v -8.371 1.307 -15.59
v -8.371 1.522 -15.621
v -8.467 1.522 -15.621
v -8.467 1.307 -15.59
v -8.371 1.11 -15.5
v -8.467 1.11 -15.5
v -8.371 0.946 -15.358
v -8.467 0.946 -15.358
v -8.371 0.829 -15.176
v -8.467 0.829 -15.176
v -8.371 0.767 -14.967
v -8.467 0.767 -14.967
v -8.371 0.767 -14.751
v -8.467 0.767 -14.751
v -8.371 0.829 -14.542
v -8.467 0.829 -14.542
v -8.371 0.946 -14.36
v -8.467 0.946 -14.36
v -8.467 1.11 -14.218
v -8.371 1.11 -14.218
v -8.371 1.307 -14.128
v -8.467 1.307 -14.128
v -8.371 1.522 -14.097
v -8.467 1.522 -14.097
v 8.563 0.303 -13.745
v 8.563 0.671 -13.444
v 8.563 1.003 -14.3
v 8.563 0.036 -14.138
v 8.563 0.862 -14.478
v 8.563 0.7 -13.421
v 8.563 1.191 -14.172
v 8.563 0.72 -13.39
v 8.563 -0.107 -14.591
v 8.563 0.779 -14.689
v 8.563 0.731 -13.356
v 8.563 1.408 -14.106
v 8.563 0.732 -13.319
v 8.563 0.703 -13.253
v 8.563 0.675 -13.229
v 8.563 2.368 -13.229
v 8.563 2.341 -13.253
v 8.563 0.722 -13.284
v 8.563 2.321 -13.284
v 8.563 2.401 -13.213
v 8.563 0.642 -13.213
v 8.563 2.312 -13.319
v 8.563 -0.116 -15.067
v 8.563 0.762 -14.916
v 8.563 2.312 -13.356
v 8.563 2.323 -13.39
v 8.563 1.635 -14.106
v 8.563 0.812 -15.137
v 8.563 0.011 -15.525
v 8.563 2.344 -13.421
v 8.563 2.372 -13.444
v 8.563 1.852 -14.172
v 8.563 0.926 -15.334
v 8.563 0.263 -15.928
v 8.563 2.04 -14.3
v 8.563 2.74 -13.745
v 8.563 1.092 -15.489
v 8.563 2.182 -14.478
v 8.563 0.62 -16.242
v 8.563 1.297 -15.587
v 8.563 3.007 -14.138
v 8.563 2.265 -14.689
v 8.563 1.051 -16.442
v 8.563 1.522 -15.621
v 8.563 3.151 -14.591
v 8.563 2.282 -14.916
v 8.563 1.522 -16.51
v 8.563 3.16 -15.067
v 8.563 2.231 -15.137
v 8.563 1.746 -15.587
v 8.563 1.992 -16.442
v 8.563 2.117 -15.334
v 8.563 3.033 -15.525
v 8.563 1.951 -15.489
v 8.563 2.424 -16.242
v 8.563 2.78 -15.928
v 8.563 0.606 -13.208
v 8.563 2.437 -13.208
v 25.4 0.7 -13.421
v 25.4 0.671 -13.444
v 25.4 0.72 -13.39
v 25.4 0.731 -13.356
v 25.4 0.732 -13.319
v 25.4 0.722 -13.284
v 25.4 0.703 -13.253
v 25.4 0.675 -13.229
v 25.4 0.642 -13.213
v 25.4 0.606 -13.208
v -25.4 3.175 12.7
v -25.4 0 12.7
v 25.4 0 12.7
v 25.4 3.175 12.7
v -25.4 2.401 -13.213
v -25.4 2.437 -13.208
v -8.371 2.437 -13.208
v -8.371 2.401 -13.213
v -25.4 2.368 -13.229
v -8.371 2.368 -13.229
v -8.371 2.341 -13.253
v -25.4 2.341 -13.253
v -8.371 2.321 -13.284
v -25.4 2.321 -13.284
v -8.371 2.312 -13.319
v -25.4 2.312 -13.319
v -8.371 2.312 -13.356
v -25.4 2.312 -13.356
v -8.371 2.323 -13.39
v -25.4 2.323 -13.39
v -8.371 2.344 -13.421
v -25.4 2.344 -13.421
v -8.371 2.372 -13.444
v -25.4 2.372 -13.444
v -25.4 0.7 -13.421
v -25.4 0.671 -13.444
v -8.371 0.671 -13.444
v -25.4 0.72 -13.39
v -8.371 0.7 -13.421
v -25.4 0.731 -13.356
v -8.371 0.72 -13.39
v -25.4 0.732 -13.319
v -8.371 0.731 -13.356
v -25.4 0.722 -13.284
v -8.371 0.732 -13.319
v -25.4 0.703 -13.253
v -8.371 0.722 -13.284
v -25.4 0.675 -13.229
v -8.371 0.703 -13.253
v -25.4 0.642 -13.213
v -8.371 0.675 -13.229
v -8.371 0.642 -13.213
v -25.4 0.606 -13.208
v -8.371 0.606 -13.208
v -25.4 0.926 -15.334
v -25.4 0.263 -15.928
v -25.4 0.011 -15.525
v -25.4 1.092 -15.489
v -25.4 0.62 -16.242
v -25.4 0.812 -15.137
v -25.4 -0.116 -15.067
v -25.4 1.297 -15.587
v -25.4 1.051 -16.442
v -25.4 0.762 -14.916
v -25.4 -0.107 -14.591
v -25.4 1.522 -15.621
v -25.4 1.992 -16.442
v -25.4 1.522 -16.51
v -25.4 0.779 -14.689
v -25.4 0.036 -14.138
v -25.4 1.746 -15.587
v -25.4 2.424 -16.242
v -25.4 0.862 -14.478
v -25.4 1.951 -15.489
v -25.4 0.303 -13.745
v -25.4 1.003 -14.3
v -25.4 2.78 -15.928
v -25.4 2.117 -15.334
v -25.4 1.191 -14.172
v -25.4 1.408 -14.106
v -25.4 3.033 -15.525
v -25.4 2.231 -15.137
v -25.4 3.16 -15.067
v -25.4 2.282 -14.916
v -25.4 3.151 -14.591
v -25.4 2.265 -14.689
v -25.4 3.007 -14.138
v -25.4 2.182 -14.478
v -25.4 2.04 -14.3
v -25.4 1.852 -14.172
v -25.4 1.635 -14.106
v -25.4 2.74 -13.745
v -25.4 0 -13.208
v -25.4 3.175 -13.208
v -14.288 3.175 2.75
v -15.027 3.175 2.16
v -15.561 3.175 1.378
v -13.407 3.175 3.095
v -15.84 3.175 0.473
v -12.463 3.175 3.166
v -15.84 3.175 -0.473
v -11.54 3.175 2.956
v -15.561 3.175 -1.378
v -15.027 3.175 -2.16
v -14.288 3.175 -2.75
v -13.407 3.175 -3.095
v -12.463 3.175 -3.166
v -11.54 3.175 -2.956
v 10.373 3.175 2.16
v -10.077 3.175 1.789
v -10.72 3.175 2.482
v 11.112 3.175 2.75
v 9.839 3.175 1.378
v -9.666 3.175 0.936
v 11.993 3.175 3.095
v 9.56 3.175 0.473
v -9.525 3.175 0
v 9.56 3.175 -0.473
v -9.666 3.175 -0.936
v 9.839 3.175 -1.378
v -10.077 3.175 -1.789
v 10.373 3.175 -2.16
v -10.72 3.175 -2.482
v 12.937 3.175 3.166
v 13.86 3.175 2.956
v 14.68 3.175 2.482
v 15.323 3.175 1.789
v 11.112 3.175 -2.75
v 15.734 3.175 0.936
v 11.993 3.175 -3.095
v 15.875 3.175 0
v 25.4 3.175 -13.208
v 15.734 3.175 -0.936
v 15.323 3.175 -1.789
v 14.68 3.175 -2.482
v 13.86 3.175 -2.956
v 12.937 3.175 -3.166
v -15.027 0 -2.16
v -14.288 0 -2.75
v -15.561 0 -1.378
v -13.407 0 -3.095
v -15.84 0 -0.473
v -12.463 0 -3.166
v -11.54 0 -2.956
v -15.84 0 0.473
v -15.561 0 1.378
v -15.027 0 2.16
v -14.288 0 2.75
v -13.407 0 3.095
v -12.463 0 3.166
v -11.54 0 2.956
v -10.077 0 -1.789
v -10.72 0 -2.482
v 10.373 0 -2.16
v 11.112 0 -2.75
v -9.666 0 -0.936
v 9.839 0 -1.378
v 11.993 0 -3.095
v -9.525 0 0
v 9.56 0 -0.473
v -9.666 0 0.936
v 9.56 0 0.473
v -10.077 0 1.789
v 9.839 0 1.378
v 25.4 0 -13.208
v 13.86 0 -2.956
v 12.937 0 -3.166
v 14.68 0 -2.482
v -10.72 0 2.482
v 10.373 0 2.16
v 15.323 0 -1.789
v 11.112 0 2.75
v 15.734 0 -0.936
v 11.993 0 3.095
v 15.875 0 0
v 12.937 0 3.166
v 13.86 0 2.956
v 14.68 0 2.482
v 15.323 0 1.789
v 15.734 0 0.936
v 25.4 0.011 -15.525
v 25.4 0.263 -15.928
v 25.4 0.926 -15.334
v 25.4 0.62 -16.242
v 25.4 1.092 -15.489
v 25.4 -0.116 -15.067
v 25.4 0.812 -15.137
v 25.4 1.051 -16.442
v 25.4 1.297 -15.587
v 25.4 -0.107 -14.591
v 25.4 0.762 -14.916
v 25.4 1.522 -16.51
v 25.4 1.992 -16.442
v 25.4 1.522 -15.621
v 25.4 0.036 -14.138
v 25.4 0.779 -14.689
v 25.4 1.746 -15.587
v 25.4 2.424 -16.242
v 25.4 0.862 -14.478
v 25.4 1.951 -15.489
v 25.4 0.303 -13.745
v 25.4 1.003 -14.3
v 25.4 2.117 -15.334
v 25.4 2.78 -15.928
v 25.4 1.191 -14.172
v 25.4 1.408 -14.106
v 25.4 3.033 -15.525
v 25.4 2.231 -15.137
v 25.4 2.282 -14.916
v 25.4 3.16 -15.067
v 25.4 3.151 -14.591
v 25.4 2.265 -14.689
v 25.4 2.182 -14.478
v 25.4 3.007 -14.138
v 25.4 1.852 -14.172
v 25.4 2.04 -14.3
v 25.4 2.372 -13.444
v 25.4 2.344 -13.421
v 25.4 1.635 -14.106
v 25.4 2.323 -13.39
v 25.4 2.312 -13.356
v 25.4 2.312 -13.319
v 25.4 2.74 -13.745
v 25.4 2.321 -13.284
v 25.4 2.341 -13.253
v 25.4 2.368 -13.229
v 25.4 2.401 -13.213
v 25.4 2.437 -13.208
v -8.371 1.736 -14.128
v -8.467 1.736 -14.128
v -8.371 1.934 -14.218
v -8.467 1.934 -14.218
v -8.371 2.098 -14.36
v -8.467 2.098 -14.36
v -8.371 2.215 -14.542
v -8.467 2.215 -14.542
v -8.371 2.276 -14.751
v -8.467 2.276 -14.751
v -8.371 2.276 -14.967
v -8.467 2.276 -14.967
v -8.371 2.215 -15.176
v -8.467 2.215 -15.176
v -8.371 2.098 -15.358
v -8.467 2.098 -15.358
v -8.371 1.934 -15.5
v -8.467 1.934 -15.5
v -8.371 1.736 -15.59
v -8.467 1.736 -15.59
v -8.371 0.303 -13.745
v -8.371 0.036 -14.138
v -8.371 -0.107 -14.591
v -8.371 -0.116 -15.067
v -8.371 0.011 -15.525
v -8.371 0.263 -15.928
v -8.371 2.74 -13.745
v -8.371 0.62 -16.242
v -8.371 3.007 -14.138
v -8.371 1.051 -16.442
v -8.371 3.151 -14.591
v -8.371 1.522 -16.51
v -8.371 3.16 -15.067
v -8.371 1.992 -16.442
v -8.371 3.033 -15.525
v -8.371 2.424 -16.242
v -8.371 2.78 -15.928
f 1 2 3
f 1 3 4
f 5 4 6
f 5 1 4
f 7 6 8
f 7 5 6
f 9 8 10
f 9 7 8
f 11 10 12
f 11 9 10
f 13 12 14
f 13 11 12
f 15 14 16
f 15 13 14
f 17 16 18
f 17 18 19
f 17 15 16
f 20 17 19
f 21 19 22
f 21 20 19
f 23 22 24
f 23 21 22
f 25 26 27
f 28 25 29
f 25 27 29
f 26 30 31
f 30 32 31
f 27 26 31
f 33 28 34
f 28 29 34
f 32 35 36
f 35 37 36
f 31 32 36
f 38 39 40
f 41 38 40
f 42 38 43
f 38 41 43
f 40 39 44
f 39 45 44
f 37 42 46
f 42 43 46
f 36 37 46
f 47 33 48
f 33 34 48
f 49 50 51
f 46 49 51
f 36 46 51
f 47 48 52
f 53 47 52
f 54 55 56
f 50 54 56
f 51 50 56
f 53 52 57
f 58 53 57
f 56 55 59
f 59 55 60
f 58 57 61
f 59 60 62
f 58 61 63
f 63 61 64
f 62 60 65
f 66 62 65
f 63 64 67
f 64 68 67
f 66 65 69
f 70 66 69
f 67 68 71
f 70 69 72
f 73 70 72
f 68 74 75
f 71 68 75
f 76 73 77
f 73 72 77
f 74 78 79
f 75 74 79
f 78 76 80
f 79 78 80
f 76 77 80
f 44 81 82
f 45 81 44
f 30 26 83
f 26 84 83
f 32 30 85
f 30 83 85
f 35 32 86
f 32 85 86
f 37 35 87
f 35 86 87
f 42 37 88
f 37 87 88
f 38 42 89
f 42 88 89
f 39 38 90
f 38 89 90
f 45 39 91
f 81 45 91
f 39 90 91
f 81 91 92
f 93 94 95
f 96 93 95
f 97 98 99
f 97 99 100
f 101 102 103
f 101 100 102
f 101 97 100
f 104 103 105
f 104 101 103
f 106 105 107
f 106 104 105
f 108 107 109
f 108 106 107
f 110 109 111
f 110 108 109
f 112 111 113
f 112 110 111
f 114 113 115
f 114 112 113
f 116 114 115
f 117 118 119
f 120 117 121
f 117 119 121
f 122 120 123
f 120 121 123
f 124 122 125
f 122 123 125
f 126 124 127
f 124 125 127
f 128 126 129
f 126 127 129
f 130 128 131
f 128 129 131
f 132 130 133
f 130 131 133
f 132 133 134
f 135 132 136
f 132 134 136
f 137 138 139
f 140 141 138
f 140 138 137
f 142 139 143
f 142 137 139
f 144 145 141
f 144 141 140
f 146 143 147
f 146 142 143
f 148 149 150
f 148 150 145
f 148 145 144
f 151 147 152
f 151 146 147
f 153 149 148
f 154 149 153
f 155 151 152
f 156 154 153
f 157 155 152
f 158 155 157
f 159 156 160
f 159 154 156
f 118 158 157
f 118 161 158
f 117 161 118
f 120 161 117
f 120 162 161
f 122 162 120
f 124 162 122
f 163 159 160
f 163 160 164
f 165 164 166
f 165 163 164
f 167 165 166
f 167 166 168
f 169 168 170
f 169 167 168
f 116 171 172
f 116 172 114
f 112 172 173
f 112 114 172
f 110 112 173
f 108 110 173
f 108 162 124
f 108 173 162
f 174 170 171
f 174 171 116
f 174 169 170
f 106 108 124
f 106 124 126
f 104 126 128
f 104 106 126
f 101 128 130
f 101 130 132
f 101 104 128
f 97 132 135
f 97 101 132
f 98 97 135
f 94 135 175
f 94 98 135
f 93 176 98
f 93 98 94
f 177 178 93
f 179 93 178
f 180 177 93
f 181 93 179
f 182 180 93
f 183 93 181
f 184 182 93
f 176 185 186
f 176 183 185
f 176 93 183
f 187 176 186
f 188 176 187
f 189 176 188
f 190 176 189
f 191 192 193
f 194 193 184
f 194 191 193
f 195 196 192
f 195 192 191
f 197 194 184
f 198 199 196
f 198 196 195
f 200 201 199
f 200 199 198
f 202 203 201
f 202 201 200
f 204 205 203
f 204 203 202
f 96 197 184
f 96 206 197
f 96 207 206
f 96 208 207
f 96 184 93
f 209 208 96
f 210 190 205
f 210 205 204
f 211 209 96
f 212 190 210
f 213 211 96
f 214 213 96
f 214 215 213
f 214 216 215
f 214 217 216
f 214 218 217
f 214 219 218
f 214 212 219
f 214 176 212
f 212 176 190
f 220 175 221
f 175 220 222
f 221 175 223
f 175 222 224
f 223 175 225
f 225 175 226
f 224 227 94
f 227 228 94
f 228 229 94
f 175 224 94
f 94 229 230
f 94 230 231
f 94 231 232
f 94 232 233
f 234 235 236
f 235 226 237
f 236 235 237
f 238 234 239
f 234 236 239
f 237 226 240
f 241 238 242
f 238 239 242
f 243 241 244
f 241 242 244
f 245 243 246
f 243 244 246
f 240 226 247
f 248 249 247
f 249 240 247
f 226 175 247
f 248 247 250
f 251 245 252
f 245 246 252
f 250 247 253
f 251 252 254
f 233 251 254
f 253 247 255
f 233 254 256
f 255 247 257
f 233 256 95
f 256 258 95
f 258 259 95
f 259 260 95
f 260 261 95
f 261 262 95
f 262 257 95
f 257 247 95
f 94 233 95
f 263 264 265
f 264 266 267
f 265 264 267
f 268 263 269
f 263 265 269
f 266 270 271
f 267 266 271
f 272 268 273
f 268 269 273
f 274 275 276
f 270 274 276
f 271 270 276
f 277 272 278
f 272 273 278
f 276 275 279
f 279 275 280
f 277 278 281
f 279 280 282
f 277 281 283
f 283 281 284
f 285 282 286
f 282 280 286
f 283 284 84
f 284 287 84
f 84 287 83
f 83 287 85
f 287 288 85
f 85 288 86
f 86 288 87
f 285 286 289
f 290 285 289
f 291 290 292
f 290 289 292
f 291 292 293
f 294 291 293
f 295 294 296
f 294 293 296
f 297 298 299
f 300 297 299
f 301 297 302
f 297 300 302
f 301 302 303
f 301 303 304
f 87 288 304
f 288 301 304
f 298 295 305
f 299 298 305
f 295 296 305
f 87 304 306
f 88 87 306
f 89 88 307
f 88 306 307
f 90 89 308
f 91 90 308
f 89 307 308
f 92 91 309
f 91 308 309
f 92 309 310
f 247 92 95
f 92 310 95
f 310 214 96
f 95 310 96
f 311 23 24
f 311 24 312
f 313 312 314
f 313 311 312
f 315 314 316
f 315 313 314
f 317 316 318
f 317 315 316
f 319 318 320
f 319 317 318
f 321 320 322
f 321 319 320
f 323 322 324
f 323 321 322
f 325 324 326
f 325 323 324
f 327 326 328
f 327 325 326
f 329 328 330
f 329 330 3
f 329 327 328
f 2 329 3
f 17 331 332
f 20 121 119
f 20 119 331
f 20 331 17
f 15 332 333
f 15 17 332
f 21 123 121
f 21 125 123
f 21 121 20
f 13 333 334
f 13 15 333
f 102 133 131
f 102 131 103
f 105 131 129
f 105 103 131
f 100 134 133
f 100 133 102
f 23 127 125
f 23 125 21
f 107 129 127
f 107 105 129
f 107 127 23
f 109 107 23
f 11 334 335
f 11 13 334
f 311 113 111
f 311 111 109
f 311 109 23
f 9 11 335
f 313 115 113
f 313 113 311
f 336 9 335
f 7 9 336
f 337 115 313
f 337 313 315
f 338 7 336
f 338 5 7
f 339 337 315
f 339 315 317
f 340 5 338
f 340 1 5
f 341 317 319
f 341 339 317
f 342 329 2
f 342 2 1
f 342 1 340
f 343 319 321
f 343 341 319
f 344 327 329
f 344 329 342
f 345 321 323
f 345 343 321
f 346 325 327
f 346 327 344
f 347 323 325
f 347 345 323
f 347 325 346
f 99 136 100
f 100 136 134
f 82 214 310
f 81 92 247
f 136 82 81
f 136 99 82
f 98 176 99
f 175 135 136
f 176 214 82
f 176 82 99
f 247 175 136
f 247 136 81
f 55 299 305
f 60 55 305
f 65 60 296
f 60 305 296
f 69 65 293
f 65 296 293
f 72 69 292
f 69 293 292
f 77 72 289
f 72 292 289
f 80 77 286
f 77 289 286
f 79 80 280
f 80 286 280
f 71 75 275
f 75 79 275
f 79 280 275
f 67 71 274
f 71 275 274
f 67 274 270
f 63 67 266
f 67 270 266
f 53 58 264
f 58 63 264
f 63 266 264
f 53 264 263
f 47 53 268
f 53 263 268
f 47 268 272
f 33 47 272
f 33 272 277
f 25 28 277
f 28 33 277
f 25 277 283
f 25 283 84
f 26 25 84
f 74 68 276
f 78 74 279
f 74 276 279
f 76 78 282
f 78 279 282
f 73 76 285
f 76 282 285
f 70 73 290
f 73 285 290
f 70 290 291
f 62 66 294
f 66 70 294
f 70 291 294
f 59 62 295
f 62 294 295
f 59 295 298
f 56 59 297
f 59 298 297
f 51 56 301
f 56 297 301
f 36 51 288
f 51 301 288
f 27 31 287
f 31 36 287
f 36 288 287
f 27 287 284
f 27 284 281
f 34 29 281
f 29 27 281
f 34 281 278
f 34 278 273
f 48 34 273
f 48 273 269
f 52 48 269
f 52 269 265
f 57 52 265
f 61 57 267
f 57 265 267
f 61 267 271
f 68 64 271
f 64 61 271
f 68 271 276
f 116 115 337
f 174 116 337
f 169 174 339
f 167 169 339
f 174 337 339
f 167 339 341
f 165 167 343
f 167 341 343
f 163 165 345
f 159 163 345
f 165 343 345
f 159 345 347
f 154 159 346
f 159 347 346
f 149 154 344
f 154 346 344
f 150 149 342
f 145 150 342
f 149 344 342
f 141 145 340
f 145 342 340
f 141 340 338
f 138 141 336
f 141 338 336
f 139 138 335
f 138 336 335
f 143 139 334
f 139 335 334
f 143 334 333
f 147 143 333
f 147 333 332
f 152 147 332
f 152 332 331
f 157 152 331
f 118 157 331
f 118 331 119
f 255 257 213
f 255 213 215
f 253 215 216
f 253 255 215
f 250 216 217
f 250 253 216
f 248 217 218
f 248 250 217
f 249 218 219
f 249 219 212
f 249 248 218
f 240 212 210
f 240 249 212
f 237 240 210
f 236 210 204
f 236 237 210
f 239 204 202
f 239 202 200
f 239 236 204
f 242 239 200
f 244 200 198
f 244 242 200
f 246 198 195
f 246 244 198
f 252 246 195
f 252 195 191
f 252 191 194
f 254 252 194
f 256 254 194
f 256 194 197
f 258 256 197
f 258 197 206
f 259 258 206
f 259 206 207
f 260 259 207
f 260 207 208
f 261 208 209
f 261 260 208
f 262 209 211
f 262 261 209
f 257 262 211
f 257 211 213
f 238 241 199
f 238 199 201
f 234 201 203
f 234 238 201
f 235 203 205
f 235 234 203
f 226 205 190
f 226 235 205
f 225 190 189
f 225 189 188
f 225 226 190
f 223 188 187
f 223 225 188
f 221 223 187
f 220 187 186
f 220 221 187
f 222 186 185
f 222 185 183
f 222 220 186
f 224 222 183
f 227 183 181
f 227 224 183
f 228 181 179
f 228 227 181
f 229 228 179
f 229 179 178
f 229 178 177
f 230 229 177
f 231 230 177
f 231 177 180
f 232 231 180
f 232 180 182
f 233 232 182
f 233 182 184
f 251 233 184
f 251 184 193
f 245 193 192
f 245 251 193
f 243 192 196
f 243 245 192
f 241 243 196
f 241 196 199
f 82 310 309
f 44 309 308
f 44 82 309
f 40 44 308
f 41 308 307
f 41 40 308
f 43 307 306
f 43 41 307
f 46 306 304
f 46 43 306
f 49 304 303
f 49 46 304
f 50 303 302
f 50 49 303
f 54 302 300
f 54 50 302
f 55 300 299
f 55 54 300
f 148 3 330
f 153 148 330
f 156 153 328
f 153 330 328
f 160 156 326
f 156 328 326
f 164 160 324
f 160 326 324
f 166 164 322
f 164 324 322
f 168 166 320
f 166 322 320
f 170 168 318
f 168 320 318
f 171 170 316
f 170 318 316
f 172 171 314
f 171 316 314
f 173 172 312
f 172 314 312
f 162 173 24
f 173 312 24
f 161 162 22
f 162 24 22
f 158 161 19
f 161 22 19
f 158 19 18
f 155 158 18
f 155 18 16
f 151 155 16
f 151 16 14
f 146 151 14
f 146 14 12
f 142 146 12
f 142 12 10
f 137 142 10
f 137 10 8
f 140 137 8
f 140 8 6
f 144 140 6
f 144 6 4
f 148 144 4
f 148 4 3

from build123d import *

# Parameters (mm, degrees)
CROQUIS3_W              = 50.8
CROQUIS3_H              = 25.4
CROQUIS3_R              = 3.175
SALIENTE_EXTRUIR1_DEPTH = 3.175
CROQUIS6_R              = 0.762
SALIENTE_EXTRUIR3_DEPTH = 8.466666667
CROQUIS7_R              = 0.762
SALIENTE_EXTRUIR4_DEPTH = 50.8
CROQUIS8_W              = 16.933333333
CROQUIS8_H              = 3.302
CORTAR_EXTRUIR2_DEPTH   = 25.4


with BuildPart() as part:
    # Croquis3 → Saliente-Extruir1 (new body)
    with BuildSketch(Plane(origin=(0, 0, 0), x_dir=(1, 0, 0), z_dir=(0, 1, 0))):
        Rectangle(CROQUIS3_W, CROQUIS3_H)
        with Locations((-12.7, 0)):
            Circle(CROQUIS3_R, mode=Mode.SUBTRACT)
        with Locations((12.7, 0)):
            Circle(CROQUIS3_R, mode=Mode.SUBTRACT)
    extrude(amount=SALIENTE_EXTRUIR1_DEPTH)

    # Croquis6 → Saliente-Extruir3 (add, symmetric)
    with BuildSketch(Plane.ZY):
        with BuildLine():
            Line((-12.7, 3.175), (-13.208, 3.175))
            Line((-13.208, 3.175), (-13.208, 2.437497499))
            ThreePointArc((-13.208, 2.437497499), (-13.301057822, 2.315117237), (-13.443857143, 2.372082497))
            ThreePointArc((-13.443857143, 2.372082497), (-16.51, 1.521687475), (-13.443857143, 0.671292453))
            ThreePointArc((-13.443857143, 0.671292453), (-13.301057822, 0.728257713), (-13.208, 0.605877451))
            Line((-13.208, 0.605877451), (-13.208, 0))
            Line((-13.208, 0), (-12.7, 0))
            Line((-12.7, 0), (-12.7, 3.175))
        make_face()
        with Locations((-14.859, 1.521687475)):
            Circle(CROQUIS6_R, mode=Mode.SUBTRACT)
    extrude(amount=SALIENTE_EXTRUIR3_DEPTH, both=True)

    # Croquis7 → Saliente-Extruir4 (add)
    with BuildSketch(Plane(origin=(25.4, 0, 0), x_dir=(0, 0, -1), z_dir=(1, 0, 0))):
        with BuildLine():
            Line((12.7, 3.175), (13.208, 3.175))
            Line((13.208, 3.175), (13.208, 2.437497499))
            ThreePointArc((13.208, 2.437497499), (13.301057822, 2.315117237), (13.443857143, 2.372082497))
            ThreePointArc((13.443857143, 2.372082497), (16.51, 1.521687475), (13.443857143, 0.671292453))
            ThreePointArc((13.443857143, 0.671292453), (13.301057822, 0.728257713), (13.208, 0.605877451))
            Line((13.208, 0.605877451), (13.208, 0))
            Line((13.208, 0), (12.7, 0))
            Line((12.7, 0), (12.7, 3.175))
        make_face()
        with Locations((14.859, 1.521687475)):
            Circle(CROQUIS7_R, mode=Mode.SUBTRACT)
    extrude(amount=-SALIENTE_EXTRUIR4_DEPTH)

    # Croquis8 → Cortar-Extruir2 (cut)
    with BuildSketch(Plane(origin=(0, 3.175, 0), x_dir=(1, 0, 0), z_dir=(0, 1, 0))):
        with Locations((0.09605237, 14.859)):
            Rectangle(CROQUIS8_W, CROQUIS8_H)
    extrude(amount=-CORTAR_EXTRUIR2_DEPTH, mode=Mode.SUBTRACT)


solid = part.part
